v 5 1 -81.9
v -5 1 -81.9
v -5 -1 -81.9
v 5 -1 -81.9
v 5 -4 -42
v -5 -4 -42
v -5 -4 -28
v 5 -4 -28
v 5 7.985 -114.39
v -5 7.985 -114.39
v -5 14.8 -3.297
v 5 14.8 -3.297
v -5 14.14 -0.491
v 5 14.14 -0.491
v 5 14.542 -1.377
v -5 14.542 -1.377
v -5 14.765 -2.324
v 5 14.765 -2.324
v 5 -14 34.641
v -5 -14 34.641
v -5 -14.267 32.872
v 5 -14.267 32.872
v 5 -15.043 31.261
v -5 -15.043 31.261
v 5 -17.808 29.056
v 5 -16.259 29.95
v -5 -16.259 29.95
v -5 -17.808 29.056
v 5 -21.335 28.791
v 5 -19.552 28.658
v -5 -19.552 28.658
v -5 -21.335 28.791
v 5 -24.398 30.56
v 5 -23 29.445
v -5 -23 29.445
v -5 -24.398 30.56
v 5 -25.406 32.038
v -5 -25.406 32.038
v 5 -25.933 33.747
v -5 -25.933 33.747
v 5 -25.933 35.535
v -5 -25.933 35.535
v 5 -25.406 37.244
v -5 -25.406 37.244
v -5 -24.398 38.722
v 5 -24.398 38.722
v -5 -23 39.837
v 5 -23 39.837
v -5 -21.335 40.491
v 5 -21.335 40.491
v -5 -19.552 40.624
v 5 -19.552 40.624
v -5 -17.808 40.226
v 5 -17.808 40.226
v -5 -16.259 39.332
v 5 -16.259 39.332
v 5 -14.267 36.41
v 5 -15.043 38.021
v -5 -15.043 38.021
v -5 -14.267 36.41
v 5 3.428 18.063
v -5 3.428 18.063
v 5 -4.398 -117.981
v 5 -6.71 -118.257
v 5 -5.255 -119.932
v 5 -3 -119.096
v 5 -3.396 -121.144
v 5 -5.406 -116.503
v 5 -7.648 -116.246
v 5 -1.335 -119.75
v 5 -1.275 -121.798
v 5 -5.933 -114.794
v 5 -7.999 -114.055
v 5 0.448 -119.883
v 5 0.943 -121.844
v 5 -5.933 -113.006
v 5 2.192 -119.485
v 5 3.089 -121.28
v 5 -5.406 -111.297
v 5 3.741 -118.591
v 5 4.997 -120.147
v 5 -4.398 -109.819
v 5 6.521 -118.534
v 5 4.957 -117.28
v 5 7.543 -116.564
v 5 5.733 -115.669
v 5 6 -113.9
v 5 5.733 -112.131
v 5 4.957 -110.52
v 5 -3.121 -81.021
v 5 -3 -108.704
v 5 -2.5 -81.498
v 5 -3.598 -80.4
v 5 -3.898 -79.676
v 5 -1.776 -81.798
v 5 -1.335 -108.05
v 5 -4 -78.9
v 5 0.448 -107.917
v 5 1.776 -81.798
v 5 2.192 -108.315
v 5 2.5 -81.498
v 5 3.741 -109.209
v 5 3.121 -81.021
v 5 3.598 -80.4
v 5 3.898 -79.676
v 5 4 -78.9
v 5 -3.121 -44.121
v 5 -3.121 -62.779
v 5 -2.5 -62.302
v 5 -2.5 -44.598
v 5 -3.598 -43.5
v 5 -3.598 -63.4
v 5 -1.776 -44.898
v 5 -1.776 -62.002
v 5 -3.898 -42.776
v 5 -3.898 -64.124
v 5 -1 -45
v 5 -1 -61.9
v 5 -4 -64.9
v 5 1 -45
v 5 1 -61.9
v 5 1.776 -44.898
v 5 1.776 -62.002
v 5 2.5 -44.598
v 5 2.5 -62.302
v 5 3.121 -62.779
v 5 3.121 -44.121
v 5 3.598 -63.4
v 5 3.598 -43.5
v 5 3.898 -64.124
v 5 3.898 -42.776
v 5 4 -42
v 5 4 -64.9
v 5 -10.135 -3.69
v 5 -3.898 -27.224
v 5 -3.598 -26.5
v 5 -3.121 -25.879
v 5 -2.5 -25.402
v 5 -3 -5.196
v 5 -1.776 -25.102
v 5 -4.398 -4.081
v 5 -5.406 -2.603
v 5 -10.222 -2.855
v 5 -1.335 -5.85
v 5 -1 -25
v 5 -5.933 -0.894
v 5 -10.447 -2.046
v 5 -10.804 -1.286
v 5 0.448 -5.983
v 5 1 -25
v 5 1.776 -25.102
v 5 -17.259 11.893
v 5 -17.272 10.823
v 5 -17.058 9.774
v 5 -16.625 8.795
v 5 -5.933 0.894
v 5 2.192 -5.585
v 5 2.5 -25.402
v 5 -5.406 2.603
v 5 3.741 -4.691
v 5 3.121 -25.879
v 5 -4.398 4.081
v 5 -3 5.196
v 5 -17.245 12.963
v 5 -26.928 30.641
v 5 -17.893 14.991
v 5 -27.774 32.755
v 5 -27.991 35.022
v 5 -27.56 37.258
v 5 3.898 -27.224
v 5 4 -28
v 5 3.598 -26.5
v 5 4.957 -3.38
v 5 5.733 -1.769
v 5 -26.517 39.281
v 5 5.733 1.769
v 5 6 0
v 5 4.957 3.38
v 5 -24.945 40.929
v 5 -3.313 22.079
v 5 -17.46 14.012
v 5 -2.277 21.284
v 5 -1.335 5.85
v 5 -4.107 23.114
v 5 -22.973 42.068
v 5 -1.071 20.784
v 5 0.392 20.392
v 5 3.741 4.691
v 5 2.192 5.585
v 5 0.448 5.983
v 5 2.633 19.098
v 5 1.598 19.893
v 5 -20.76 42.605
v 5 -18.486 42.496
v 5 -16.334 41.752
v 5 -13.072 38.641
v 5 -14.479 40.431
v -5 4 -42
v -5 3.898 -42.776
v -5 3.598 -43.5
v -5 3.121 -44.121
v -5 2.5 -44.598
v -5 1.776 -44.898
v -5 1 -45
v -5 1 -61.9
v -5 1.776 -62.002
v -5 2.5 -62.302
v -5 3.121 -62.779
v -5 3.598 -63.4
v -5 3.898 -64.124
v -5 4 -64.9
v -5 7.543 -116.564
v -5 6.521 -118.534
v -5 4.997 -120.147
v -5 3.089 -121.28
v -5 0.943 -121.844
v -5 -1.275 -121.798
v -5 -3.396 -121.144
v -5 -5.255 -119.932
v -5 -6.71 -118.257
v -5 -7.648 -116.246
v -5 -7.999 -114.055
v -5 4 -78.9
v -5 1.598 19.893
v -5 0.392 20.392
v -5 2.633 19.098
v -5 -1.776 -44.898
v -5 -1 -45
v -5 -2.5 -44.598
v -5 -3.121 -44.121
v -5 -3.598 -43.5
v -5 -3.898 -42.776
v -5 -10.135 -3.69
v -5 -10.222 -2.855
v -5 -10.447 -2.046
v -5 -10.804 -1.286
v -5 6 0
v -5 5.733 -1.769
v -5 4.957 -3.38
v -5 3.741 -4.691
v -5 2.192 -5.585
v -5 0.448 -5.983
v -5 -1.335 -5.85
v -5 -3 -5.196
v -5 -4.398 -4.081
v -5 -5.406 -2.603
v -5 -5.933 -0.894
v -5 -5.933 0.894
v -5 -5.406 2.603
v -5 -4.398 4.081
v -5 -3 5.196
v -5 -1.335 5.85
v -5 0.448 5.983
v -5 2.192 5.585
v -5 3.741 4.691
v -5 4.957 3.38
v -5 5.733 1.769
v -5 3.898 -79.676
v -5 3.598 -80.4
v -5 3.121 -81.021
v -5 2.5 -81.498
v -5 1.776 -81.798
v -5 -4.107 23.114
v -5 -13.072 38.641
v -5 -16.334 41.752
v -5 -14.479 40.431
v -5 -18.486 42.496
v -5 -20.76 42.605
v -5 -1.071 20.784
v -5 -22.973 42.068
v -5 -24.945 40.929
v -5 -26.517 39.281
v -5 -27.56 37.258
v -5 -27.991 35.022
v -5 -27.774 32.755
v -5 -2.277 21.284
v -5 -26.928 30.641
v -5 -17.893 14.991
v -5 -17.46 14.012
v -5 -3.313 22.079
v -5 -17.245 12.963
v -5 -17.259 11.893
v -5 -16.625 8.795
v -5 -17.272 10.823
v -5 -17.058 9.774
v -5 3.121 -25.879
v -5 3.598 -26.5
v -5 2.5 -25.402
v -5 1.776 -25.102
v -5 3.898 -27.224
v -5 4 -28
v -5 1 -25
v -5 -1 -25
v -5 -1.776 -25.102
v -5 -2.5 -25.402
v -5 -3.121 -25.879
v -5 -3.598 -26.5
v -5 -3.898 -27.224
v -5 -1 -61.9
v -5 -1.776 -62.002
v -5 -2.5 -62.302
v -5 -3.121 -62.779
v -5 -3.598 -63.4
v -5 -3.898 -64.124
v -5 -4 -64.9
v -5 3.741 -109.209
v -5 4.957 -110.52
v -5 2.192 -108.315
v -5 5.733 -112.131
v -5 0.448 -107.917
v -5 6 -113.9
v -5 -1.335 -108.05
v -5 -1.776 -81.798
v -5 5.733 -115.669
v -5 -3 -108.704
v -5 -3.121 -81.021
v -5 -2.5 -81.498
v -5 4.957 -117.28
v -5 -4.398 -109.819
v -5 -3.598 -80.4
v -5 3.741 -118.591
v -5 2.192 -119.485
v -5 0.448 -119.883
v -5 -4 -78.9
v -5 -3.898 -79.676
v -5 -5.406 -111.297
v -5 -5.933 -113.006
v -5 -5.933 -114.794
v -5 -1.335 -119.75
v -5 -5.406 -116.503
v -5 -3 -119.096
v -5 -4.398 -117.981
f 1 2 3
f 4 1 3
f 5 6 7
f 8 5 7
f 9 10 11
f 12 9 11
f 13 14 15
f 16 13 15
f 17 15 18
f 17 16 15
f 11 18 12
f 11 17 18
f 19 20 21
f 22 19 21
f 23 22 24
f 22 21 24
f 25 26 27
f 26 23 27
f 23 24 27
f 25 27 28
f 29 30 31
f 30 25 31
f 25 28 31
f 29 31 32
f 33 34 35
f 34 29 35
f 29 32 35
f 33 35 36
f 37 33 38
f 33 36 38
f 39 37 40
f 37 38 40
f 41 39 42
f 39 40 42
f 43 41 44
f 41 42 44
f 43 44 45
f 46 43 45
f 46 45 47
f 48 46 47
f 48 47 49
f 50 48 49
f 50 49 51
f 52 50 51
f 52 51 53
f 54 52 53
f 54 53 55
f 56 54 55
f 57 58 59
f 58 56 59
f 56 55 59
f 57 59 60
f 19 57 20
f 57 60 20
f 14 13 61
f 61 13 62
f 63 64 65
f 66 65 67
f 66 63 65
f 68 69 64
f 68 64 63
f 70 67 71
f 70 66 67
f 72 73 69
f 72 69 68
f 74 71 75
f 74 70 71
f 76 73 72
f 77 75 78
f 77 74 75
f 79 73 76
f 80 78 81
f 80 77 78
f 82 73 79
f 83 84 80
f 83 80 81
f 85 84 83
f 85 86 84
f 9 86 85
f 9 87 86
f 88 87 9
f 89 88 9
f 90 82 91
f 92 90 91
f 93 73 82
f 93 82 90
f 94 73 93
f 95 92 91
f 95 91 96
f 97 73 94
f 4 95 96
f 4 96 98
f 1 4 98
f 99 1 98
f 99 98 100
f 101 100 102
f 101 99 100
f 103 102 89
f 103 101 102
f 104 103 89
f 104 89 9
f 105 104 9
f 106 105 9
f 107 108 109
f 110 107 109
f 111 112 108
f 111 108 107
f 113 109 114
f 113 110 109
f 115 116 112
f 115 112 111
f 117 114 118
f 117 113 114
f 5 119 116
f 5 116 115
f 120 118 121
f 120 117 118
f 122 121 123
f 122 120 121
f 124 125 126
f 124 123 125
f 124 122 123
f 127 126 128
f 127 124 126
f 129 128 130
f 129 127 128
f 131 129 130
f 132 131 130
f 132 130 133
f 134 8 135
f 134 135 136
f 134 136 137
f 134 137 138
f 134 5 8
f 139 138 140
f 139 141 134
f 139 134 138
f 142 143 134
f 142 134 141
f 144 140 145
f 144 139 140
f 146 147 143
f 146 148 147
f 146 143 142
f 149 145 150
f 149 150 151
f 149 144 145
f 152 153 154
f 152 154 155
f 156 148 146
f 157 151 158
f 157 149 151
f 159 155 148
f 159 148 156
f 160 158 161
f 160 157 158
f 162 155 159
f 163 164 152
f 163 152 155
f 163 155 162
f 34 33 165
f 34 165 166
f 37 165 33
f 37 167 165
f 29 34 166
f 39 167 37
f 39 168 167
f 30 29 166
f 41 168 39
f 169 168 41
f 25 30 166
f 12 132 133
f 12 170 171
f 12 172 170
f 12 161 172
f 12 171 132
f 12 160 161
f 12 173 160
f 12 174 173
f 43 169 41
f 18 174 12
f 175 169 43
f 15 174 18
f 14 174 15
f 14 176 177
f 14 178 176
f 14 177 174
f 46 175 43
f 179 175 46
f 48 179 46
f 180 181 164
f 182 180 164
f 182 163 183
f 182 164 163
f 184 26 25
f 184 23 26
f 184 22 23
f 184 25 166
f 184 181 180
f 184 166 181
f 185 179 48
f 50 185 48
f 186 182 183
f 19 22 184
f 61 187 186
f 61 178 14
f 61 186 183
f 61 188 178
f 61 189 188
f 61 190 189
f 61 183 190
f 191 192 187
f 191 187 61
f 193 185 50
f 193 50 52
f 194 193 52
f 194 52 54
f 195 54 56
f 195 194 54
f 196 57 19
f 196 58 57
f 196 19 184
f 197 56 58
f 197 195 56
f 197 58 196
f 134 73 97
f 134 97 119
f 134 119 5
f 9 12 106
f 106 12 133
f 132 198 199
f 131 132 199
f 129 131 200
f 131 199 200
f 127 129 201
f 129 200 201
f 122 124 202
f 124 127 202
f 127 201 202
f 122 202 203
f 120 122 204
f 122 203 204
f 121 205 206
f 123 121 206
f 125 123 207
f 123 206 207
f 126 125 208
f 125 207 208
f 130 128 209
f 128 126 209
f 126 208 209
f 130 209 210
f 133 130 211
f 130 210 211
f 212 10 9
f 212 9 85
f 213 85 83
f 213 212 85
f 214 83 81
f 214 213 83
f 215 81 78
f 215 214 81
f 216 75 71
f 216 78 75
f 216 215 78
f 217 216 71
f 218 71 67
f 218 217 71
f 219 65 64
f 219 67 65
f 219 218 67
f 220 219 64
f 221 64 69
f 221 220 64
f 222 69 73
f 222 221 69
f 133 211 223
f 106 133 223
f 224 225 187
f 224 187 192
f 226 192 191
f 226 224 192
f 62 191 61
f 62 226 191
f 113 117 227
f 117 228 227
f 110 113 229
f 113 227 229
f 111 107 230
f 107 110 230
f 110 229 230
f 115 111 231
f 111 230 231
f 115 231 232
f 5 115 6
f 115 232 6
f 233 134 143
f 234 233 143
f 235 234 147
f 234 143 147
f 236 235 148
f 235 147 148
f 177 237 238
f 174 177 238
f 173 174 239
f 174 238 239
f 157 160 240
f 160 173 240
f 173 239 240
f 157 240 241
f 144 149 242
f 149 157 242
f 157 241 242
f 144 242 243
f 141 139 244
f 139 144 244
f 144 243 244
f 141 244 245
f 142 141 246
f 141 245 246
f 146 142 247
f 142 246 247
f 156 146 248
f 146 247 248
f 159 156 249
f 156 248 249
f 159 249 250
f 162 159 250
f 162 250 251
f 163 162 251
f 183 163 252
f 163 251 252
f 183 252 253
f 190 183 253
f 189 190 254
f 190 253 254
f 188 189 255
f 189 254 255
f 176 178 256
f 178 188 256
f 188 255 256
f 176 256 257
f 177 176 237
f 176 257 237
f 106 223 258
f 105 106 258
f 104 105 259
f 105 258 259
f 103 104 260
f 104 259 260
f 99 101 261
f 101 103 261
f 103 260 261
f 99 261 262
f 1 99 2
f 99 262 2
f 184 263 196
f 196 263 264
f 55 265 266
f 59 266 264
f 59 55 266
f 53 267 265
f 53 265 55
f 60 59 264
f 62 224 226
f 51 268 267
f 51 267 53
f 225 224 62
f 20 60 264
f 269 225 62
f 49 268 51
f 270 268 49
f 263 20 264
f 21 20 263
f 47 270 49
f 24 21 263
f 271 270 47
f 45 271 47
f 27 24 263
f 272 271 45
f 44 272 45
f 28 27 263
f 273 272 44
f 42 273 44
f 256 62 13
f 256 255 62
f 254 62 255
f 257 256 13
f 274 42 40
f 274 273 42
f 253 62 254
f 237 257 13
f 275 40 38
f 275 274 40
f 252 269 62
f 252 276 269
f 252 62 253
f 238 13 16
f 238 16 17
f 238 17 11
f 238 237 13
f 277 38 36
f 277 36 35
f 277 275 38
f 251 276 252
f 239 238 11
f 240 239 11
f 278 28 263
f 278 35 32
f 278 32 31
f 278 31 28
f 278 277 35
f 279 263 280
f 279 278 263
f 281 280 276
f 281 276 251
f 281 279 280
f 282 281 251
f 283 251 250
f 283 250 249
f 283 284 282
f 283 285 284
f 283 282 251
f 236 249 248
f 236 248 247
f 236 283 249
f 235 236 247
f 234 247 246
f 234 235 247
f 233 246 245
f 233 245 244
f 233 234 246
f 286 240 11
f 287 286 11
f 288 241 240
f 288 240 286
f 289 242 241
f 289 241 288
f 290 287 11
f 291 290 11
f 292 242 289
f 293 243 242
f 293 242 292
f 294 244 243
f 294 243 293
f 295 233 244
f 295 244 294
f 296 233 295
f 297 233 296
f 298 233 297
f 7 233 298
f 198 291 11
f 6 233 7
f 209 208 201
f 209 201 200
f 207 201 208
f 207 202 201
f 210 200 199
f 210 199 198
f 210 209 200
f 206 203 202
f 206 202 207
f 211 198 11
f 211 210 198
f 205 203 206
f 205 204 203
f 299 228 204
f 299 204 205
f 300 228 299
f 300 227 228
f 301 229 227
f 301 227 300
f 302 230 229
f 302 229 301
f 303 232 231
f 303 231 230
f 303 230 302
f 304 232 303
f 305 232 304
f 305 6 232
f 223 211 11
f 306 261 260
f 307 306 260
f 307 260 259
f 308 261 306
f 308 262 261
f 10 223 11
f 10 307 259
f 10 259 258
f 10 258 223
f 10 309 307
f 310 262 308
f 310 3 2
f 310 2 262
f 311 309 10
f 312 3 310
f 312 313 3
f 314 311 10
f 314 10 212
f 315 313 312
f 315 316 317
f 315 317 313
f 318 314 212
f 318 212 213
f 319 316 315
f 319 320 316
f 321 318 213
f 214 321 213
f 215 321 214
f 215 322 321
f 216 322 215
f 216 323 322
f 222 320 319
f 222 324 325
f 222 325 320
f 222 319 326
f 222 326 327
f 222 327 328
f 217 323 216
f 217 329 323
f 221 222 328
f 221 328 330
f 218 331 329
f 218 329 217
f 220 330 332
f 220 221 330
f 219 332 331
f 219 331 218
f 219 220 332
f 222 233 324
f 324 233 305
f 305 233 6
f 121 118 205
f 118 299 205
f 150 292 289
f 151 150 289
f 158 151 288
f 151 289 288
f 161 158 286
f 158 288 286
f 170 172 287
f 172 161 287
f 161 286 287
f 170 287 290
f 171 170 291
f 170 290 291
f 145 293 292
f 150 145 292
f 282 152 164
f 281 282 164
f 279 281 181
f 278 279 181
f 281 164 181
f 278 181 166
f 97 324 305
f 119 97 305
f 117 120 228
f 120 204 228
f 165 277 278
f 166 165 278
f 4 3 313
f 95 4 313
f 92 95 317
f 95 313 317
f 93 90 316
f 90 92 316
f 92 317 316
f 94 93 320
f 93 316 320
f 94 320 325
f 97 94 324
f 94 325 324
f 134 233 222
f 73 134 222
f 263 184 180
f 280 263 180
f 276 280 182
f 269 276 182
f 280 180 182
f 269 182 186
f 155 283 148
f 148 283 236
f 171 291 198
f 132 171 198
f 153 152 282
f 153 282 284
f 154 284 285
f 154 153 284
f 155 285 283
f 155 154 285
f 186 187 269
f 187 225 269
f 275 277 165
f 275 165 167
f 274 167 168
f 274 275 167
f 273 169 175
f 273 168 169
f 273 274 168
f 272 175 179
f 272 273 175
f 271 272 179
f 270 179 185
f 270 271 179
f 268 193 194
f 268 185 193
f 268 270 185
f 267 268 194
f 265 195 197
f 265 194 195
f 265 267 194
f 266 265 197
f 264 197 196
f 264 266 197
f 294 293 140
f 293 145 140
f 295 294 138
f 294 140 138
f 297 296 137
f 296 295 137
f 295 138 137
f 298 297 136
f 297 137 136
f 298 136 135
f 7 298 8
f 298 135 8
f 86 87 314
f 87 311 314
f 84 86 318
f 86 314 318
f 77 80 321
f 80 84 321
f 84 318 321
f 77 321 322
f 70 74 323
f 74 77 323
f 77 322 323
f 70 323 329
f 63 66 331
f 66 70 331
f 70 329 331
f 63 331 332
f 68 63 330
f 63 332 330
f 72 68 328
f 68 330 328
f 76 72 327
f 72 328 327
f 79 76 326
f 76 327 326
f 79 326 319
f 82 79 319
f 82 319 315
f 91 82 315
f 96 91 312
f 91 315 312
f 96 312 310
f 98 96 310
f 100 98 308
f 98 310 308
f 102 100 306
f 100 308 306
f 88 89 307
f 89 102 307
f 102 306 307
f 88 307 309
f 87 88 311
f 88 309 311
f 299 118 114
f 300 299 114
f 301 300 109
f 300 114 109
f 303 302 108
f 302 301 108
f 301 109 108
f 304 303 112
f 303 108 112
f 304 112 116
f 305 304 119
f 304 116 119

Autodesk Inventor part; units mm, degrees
ref_plane "YZ Plane" through (0, 0, 0) normal (1, 0, 0) x (0, 1, 0)
ref_plane "XZ Plane" through (0, 0, 0) normal (0, 1, 0) x (-1, 0, 0)
ref_plane "XY Plane" through (0, 0, 0) normal (0, 0, 1) x (1, 0, 0)
sketch "草圖1" plane through (0, 0, 0) normal (1, 0, 0) x (0, 1, 0)
  line L0 (0, 0) -> (0, -113.9)
  line L1 (0, 0) -> (-20, 34.641016)
  circle A0 centre (0, 0) radius 6
  circle A1 centre (0, 0) radius 8
  circle A2 centre (-20, 34.641016) radius 6
  circle A3 centre (-20, 34.641016) radius 8
  circle A4 centre (0, -113.9) radius 6
  circle A5 centre (0, -113.9) radius 8
  line L2 (-13.071797, 38.641016) -> (-3.071797, 21.320508)
  line L3 (-3.071797, 21.320508) -> (2.392305, 19.856406)
  line L4 (2.392305, 19.856406) -> (14.892305, -1.794229)
  line L5 (14.892305, -1.794229) -> (7.984989, -114.389849)
  line L6 (-26.928203, 30.641016) -> (-16.928203, 13.320508)
  line L7 (-16.928203, 13.320508) -> (-17.660254, 10.588457)
  line L8 (-17.660254, 10.588457) -> (-10.160254, -2.401924)
  line L9 (-10.160254, -2.401924) -> (-7.998501, -114.054862)
  line L10 (4, -25) -> (-4, -25)
  line L11 (-4, -25) -> (-4, -45)
  line L12 (-4, -45) -> (4, -45)
  line L13 (4, -45) -> (4, -25)
  line L14 (4, -61.9) -> (-4, -61.9)
  line L15 (-4, -61.9) -> (-4, -81.9)
  line L16 (-4, -81.9) -> (4, -81.9)
  line L17 (4, -81.9) -> (4, -61.9)
  point P0 (0, -25)
  point P1 (0, -61.9)
  dimension "d0" = 113.9
  dimension "d1" = 40
  dimension "d2" = 150
  dimension "d3" = 12
  dimension "d4" = 16
  dimension "d5" = 12
  dimension "d6" = 16
  dimension "d7" = 12
  dimension "d8" = 16
  dimension "d9" = 25
  dimension "d10" = 15
  dimension "d11" = 135
  dimension "d12" = 135
  dimension "d13" = 20
  dimension "d14" = 20
  dimension "d15" = 10
  dimension "d16" = 12
  dimension "d21" = 20
  dimension "d22" = 8
  dimension "d23" = 25
  dimension "d25" = 32
sketch "草圖1 outline for 擠出1" plane through (0, 0, 0) normal (1, 0, 0) x (0, 1, 0)
  line L0 (7.984989, -114.389849) -> (14.892305, -1.794229)
  arc A0 (-7.998501, -114.054862) -> (7.984989, -114.389849) centre (0, -113.9) ccw
  line L1 (14.892305, -1.794229) -> (2.392305, 19.856406)
  line L2 (-10.160254, -2.401924) -> (-7.998501, -114.054862)
  line L3 (2.392305, 19.856406) -> (-3.071797, 21.320508)
  line L4 (-17.660254, 10.588457) -> (-10.160254, -2.401924)
  line L5 (-3.071797, 21.320508) -> (-13.071797, 38.641016)
  line L6 (-16.928203, 13.320508) -> (-17.660254, 10.588457)
  arc A1 (-13.071797, 38.641016) -> (-26.928203, 30.641016) centre (-20, 34.641016) ccw
  line L7 (-26.928203, 30.641016) -> (-16.928203, 13.320508)
  circle A2 centre (0, -113.9) radius 6
  line L8 (-4, -61.9) -> (4, -61.9)
  line L9 (-4, -81.9) -> (-4, -61.9)
  line L10 (4, -81.9) -> (-4, -81.9)
  line L11 (4, -61.9) -> (4, -81.9)
  circle A3 centre (-20, 34.641016) radius 6
  line L12 (-4, -25) -> (4, -25)
  line L13 (-4, -45) -> (-4, -25)
  line L14 (4, -45) -> (-4, -45)
  line L15 (4, -25) -> (4, -45)
  circle A4 centre (0, 0) radius 6
extrude "擠出1" add sketch "草圖1 outline for 擠出1" along normal mid plane 10
fillet "圓角2" radius 3 8 edges at (0, 4, -45) (0, 4, -25) (0, -4, -25) (0, -4, -45) (0, -4, -61.9) (0, 4, -61.9) (0, -4, -81.9) (0, 4, -81.9)
fillet "圓角3" radius 5 6 edges at (0, 14.8923, -1.7942) (0, 2.3923, 19.8564) (0, -3.0718, 21.3205) (0, -16.9282, 13.3205) (0, -17.6603, 10.5885) (0, -10.1603, -2.4019)
equation "\"d5\" = d3"
equation "\"d6\" = d4"
equation "\"d7\" = d3"
equation "\"d8\" = d4"
equation "\"d12\" = d11"
equation "\"d14\" = d13"
properties part number "Link_ECH" material "ABS 塑膠"
